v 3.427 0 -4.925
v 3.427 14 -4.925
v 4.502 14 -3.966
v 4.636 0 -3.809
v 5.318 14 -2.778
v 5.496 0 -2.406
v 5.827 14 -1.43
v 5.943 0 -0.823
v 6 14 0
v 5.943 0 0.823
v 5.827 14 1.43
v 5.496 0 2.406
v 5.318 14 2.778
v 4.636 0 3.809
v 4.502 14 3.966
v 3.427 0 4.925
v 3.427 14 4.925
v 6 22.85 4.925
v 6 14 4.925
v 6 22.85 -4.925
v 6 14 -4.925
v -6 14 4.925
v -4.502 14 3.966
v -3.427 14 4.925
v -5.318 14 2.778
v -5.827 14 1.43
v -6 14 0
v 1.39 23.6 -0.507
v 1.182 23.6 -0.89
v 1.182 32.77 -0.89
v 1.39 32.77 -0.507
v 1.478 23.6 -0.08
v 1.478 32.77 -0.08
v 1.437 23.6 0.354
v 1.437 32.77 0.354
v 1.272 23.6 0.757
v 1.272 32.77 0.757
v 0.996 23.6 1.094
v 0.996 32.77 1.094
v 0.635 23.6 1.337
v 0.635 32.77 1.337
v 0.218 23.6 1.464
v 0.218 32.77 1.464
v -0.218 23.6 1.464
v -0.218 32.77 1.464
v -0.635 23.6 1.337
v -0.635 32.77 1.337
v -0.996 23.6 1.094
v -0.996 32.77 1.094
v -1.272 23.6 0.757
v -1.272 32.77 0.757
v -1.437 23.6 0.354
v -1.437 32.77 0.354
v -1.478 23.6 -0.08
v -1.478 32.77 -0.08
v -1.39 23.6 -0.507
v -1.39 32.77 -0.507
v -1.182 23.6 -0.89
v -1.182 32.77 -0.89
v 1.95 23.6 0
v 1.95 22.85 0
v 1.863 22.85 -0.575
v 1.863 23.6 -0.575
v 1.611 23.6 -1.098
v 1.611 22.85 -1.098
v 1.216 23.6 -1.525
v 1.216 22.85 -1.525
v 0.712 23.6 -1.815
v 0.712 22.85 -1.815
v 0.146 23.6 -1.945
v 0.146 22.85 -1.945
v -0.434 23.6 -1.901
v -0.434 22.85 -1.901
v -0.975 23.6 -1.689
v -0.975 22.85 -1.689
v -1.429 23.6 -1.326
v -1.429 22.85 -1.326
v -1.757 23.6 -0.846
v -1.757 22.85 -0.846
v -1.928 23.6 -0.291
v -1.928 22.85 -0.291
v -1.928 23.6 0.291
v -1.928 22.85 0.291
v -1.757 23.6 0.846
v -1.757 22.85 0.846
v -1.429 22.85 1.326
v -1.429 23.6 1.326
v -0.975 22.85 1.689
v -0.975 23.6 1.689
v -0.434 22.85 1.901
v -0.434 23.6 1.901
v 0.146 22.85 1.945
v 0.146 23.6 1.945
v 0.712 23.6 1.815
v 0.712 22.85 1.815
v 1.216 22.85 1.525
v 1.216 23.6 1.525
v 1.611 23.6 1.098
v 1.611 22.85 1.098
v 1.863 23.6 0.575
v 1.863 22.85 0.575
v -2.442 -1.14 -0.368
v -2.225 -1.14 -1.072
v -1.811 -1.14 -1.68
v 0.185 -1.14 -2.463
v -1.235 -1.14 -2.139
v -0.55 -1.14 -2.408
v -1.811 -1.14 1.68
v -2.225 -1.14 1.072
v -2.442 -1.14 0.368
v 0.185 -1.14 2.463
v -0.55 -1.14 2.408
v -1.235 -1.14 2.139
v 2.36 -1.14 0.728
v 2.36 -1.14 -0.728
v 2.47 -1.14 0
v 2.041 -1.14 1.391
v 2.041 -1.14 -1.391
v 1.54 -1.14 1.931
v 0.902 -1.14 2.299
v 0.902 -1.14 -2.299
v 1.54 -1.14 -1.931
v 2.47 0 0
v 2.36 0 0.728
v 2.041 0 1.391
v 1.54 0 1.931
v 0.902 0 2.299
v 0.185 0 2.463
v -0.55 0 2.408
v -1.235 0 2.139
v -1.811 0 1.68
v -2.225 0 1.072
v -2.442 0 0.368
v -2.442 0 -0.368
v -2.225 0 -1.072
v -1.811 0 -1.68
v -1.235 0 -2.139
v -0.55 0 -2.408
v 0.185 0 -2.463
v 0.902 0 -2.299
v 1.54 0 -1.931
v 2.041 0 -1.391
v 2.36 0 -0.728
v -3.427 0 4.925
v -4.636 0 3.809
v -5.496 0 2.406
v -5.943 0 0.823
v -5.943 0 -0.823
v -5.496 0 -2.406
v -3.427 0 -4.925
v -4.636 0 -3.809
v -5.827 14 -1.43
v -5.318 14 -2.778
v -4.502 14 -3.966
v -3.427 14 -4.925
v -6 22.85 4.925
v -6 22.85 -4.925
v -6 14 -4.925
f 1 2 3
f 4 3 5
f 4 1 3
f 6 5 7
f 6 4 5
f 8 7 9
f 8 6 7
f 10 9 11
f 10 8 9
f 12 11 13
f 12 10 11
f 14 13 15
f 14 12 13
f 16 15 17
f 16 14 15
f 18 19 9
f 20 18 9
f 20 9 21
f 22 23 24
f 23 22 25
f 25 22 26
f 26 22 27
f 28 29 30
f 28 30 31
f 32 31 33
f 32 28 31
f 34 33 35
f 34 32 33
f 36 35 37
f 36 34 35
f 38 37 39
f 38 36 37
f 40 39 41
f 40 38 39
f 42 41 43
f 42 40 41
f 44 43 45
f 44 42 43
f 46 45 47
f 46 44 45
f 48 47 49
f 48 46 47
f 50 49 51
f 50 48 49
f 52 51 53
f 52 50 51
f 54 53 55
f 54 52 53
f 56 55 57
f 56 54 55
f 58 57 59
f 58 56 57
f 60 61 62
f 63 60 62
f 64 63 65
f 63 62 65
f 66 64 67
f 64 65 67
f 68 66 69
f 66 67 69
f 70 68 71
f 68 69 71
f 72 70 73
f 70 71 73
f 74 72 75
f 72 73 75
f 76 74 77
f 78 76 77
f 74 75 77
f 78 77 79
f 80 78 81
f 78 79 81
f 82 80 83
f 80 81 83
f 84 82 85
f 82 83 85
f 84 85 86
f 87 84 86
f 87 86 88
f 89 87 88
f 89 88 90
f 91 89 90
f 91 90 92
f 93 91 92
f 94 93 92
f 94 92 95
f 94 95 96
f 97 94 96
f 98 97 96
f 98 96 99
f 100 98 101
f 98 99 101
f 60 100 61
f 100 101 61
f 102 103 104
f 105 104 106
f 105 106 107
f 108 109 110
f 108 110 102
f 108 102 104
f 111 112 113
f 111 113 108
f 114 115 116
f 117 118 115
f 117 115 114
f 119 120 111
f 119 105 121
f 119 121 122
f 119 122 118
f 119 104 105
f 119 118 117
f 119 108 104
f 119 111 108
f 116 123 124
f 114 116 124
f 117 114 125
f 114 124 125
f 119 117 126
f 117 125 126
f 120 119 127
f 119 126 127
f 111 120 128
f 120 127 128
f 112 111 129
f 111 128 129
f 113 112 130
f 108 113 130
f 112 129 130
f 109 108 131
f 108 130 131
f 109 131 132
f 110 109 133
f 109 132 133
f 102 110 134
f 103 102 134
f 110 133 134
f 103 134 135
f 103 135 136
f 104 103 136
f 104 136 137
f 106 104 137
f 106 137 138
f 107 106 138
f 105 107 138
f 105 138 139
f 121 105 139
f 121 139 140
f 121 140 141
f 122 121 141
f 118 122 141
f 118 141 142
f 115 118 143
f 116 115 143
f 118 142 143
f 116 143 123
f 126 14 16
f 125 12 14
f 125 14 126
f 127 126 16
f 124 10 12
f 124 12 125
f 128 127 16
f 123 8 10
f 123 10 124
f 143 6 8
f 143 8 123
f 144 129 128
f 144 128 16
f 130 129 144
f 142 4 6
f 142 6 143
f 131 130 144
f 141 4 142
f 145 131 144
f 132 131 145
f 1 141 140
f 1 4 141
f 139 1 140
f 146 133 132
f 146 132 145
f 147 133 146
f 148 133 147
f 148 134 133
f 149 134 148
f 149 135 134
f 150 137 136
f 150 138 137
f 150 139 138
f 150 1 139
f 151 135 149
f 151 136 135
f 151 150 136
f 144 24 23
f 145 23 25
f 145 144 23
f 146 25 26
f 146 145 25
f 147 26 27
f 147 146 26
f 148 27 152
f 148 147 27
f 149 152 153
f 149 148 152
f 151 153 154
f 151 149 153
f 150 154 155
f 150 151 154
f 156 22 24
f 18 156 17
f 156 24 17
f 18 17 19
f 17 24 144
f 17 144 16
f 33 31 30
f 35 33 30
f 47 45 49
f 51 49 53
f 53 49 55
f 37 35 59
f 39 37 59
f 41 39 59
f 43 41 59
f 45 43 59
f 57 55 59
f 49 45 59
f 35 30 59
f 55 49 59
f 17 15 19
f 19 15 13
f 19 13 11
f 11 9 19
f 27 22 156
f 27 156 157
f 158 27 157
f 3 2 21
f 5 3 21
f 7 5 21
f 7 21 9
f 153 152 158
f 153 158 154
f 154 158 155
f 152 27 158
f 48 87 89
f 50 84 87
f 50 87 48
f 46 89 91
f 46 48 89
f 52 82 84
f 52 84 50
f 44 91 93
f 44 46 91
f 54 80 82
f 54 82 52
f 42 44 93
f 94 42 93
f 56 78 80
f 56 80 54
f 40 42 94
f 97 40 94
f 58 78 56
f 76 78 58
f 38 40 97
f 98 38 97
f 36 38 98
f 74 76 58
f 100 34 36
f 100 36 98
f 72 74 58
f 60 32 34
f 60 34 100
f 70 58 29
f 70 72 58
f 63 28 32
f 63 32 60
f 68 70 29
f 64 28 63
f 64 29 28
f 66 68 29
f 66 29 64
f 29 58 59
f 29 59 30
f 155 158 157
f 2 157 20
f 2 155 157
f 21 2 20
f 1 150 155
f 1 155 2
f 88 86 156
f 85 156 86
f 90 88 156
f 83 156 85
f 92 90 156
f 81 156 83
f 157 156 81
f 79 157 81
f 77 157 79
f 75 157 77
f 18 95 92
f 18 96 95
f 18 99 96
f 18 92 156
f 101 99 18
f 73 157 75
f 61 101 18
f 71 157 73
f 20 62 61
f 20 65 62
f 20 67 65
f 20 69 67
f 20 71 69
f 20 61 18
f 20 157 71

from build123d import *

# Parameters (mm, degrees)
BOSS_EXTRUDE1_DEPTH = 14
SKETCH3_W           = 12
SKETCH3_H           = 9.85
BOSS_EXTRUDE2_DEPTH = 8.85
SKETCH4_R           = 1.95
BOSS_EXTRUDE3_DEPTH = 0.75
BOSS_EXTRUDE4_DEPTH = 9.17
SKETCH6_R           = 2.47
BOSS_EXTRUDE5_DEPTH = 1.14


with BuildPart() as part:
    # Sketch2 → Boss-Extrude1 (new body)
    with BuildSketch(Plane(origin=(0, 0, 0), x_dir=(1, 0, 0), z_dir=(0, 1, 0))):
        with BuildLine():
            Line((-3.427006711, 4.925), (3.427006711, 4.925))
            ThreePointArc((3.427006711, 4.925), (6, 0), (3.427006711, -4.925))
            Line((3.427006711, -4.925), (-3.427006711, -4.925))
            ThreePointArc((-3.427006711, -4.925), (-6, 0), (-3.427006711, 4.925))
        make_face()
    extrude(amount=BOSS_EXTRUDE1_DEPTH)

    # Sketch3 → Boss-Extrude2 (add)
    with BuildSketch(Plane(origin=(0, 14, 0), x_dir=(1, 0, 0), z_dir=(0, 1, 0))):
        Rectangle(SKETCH3_W, SKETCH3_H)
    extrude(amount=BOSS_EXTRUDE2_DEPTH)

    # Sketch4 → Boss-Extrude3 (add)
    with BuildSketch(Plane(origin=(0, 22.85, 0), x_dir=(1, 0, 0), z_dir=(0, 1, 0))):
        Circle(SKETCH4_R)
    extrude(amount=BOSS_EXTRUDE3_DEPTH)

    # Sketch5 → Boss-Extrude4 (add)
    with BuildSketch(Plane(origin=(0, 23.6, 0), x_dir=(1, 0, 0), z_dir=(0, 1, 0))):
        with BuildLine():
            Line((-1.182497357, 0.89), (1.182497357, 0.89))
            ThreePointArc((1.182497357, 0.89), (0, -1.48), (-1.182497357, 0.89))
        make_face()
    extrude(amount=BOSS_EXTRUDE4_DEPTH)

    # Sketch6 → Boss-Extrude5 (add)
    with BuildSketch(Plane.XZ):
        Circle(SKETCH6_R)
    extrude(amount=BOSS_EXTRUDE5_DEPTH)


solid = part.part
